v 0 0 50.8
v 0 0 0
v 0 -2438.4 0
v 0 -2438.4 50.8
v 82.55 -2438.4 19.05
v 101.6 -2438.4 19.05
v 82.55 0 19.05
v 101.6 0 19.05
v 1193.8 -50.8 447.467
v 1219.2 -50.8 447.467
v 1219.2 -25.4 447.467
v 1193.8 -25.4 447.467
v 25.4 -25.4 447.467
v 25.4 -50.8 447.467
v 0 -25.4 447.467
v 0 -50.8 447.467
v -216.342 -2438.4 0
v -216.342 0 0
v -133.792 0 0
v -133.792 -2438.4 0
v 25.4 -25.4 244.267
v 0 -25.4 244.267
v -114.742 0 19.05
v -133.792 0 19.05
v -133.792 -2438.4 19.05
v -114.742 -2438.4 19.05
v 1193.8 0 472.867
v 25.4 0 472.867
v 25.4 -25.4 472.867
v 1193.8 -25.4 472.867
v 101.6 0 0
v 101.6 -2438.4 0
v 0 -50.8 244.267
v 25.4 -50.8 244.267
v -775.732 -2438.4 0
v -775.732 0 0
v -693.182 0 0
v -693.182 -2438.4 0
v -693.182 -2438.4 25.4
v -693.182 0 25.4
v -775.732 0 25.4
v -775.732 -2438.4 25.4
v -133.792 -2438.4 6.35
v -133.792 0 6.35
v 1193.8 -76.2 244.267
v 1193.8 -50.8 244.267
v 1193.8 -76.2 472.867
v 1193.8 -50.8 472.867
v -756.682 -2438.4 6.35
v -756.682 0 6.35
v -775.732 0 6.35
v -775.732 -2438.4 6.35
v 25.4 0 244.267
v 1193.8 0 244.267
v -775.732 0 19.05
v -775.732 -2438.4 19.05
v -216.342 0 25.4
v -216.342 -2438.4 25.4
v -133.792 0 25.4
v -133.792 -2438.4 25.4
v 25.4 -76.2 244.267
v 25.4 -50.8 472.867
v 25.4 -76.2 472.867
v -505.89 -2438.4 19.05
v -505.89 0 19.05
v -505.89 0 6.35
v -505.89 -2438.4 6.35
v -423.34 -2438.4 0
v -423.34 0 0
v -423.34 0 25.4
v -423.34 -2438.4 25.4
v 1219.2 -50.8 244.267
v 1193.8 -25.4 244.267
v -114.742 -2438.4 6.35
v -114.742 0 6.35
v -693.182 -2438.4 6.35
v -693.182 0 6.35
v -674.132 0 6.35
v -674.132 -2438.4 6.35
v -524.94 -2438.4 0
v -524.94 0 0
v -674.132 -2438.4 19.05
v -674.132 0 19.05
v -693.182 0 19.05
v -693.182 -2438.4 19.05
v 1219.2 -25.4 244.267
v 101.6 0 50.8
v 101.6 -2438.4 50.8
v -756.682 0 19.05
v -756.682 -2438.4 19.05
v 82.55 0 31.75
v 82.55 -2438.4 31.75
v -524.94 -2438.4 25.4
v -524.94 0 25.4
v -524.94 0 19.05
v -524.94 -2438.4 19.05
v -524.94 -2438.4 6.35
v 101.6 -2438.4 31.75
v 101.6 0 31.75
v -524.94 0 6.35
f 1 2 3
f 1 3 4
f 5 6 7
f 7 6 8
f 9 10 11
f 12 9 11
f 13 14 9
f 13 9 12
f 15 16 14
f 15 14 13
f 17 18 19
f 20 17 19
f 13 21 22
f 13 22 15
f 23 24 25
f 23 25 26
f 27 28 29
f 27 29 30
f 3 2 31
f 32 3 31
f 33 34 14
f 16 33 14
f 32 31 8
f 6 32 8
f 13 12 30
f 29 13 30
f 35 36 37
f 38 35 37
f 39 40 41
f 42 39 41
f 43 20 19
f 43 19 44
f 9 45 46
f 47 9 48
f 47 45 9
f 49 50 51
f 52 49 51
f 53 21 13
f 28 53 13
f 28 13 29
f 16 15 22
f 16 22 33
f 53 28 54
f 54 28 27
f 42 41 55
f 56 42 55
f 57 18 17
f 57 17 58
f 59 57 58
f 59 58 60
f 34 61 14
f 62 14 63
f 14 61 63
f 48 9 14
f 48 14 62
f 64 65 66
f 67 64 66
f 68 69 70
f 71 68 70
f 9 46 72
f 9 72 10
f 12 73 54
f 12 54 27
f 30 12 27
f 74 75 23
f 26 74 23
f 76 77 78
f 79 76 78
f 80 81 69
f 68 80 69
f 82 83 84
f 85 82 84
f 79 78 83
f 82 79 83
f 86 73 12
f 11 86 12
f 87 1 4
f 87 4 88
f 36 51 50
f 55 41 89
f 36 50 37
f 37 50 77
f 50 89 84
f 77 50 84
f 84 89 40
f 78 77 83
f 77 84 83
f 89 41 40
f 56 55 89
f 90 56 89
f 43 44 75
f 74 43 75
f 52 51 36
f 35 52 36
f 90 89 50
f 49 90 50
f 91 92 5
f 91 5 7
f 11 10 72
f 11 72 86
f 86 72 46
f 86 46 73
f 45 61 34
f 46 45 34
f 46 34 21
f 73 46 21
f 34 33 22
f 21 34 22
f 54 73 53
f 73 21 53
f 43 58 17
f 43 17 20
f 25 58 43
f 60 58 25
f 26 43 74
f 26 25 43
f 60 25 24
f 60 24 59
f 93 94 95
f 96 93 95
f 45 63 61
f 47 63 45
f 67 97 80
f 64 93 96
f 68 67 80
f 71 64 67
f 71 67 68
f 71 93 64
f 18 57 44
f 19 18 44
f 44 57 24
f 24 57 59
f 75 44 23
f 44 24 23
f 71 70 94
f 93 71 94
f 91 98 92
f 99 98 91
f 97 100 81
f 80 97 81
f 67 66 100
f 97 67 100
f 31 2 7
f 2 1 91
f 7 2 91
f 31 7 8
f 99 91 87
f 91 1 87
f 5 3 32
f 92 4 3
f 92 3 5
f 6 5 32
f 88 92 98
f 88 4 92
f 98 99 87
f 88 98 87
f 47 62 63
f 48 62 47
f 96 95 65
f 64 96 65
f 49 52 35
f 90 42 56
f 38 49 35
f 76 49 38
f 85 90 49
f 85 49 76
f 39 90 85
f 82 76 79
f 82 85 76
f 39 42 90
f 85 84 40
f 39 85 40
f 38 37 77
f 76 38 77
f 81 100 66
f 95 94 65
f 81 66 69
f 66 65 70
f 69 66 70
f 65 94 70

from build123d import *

# Parameters (mm, degrees)
F0_W      = 101.6
F0_H      = 50.8
F1_DEPTH  = 2438.4
F2_W      = 2438.4
F2_H      = 12.7
F3_DEPTH  = 19.05
F4_W      = 101.6
F4_H      = 25.4
F5_DEPTH  = 2438.4
F6_W      = 19.05
F6_H      = 6.35
F7_DEPTH  = 2438.4
F9_DEPTH  = 2438.4
F11_DEPTH = 2438.4
F12_W     = 1219.2
F12_H     = 228.6
F13_DEPTH = 76.2
F14_W     = 25.4
F14_H     = 25.4
F15_DEPTH = 2438.4
F16_W     = 25.4
F16_H     = 228.6
F17_DEPTH = 254
F18_W     = 25.4
F18_H     = 203.2
F19_DEPTH = 25.4
F20_W     = 25.4
F20_H     = 203.2
F21_DEPTH = 25.4


with BuildPart() as f1:
    # F0 (on Front) → F1 (new body)
    with BuildSketch(Plane.XZ):
        with Locations((50.8, 25.4)):
            Rectangle(F0_W, F0_H)
    extrude(amount=F1_DEPTH)

    # F2 (on face) → F3 (cut)
    with BuildSketch(Plane.YZ.offset(101.6)):
        with Locations((-1219.2, 25.4)):
            Rectangle(F2_W, F2_H)
    extrude(amount=-F3_DEPTH, mode=Mode.SUBTRACT)


with BuildPart() as f5:
    # F4 (on Front) → F5 (new body)
    with BuildSketch(Plane.XZ):
        with Locations((-165.54243, 12.7)):
            Rectangle(F4_W, F4_H)
    extrude(amount=F5_DEPTH)

    # F6 (on face) → F7 (cut)
    with BuildSketch(Plane.XZ.offset(2438.4)):
        with Locations((-124.26743, 22.225)):
            Rectangle(F6_W, F6_H)
        with Locations((-124.26743, 3.175)):
            Rectangle(F6_W, F6_H)
    extrude(amount=-F7_DEPTH, mode=Mode.SUBTRACT)


with BuildPart() as f9:
    # F8 (on Front) → F9 (new body)
    with BuildSketch(Plane.XZ):
        Polygon((-524.939765, 0), (-423.339765, 0), (-423.339765, 25.4), (-524.939765, 25.4), (-524.939765, 19.05), (-505.889765, 19.05), (-505.889765, 6.35), (-524.939765, 6.35), align=None)
    extrude(amount=F9_DEPTH)


with BuildPart() as f11:
    # F10 (on Front) → F11 (new body)
    with BuildSketch(Plane.XZ):
        Polygon((-775.732246, 0), (-693.182246, 0), (-693.182246, 6.35), (-674.132246, 6.35), (-674.132246, 19.05), (-693.182246, 19.05), (-693.182246, 25.4), (-775.732246, 25.4), (-775.732246, 19.05), (-756.682246, 19.05), (-756.682246, 6.35), (-775.732246, 6.35), align=None)
    extrude(amount=F11_DEPTH)


with BuildPart() as f13:
    # F12 (on Front) → F13 (new body)
    with BuildSketch(Plane.XZ):
        with Locations((609.6, 358.567115)):
            Rectangle(F12_W, F12_H)
    extrude(amount=F13_DEPTH)

    # F14 (on face) → F15 (cut)
    with BuildSketch(Plane.YZ.offset(1219.2)):
        with Locations((-38.1, 460.167115)):
            Rectangle(F14_W, F14_H)
    extrude(amount=-F15_DEPTH, mode=Mode.SUBTRACT)

    # F16 (on face) → F17 (cut)
    with BuildSketch(Plane.XZ.offset(76.2)):
        with Locations((1206.5, 358.567115)):
            Rectangle(F16_W, F16_H)
        with Locations((12.7, 358.567115)):
            Rectangle(F16_W, F16_H)
    extrude(amount=-F17_DEPTH, mode=Mode.SUBTRACT)

    # F18 (on face) → F19 (join)
    with BuildSketch(Plane(origin=(25.4, 0, 0), x_dir=(0, -1, 0), z_dir=(-1, 0, 0))):
        with Locations((38.1, 345.867115)):
            Rectangle(F18_W, F18_H)
    extrude(amount=F19_DEPTH)

    # F20 (on face) → F21 (join)
    with BuildSketch(Plane.YZ.offset(1193.8)):
        with Locations((-38.1, 345.867115)):
            Rectangle(F20_W, F20_H)
    extrude(amount=F21_DEPTH)


solid = Compound([f1.part, f5.part, f9.part, f11.part, f13.part])
